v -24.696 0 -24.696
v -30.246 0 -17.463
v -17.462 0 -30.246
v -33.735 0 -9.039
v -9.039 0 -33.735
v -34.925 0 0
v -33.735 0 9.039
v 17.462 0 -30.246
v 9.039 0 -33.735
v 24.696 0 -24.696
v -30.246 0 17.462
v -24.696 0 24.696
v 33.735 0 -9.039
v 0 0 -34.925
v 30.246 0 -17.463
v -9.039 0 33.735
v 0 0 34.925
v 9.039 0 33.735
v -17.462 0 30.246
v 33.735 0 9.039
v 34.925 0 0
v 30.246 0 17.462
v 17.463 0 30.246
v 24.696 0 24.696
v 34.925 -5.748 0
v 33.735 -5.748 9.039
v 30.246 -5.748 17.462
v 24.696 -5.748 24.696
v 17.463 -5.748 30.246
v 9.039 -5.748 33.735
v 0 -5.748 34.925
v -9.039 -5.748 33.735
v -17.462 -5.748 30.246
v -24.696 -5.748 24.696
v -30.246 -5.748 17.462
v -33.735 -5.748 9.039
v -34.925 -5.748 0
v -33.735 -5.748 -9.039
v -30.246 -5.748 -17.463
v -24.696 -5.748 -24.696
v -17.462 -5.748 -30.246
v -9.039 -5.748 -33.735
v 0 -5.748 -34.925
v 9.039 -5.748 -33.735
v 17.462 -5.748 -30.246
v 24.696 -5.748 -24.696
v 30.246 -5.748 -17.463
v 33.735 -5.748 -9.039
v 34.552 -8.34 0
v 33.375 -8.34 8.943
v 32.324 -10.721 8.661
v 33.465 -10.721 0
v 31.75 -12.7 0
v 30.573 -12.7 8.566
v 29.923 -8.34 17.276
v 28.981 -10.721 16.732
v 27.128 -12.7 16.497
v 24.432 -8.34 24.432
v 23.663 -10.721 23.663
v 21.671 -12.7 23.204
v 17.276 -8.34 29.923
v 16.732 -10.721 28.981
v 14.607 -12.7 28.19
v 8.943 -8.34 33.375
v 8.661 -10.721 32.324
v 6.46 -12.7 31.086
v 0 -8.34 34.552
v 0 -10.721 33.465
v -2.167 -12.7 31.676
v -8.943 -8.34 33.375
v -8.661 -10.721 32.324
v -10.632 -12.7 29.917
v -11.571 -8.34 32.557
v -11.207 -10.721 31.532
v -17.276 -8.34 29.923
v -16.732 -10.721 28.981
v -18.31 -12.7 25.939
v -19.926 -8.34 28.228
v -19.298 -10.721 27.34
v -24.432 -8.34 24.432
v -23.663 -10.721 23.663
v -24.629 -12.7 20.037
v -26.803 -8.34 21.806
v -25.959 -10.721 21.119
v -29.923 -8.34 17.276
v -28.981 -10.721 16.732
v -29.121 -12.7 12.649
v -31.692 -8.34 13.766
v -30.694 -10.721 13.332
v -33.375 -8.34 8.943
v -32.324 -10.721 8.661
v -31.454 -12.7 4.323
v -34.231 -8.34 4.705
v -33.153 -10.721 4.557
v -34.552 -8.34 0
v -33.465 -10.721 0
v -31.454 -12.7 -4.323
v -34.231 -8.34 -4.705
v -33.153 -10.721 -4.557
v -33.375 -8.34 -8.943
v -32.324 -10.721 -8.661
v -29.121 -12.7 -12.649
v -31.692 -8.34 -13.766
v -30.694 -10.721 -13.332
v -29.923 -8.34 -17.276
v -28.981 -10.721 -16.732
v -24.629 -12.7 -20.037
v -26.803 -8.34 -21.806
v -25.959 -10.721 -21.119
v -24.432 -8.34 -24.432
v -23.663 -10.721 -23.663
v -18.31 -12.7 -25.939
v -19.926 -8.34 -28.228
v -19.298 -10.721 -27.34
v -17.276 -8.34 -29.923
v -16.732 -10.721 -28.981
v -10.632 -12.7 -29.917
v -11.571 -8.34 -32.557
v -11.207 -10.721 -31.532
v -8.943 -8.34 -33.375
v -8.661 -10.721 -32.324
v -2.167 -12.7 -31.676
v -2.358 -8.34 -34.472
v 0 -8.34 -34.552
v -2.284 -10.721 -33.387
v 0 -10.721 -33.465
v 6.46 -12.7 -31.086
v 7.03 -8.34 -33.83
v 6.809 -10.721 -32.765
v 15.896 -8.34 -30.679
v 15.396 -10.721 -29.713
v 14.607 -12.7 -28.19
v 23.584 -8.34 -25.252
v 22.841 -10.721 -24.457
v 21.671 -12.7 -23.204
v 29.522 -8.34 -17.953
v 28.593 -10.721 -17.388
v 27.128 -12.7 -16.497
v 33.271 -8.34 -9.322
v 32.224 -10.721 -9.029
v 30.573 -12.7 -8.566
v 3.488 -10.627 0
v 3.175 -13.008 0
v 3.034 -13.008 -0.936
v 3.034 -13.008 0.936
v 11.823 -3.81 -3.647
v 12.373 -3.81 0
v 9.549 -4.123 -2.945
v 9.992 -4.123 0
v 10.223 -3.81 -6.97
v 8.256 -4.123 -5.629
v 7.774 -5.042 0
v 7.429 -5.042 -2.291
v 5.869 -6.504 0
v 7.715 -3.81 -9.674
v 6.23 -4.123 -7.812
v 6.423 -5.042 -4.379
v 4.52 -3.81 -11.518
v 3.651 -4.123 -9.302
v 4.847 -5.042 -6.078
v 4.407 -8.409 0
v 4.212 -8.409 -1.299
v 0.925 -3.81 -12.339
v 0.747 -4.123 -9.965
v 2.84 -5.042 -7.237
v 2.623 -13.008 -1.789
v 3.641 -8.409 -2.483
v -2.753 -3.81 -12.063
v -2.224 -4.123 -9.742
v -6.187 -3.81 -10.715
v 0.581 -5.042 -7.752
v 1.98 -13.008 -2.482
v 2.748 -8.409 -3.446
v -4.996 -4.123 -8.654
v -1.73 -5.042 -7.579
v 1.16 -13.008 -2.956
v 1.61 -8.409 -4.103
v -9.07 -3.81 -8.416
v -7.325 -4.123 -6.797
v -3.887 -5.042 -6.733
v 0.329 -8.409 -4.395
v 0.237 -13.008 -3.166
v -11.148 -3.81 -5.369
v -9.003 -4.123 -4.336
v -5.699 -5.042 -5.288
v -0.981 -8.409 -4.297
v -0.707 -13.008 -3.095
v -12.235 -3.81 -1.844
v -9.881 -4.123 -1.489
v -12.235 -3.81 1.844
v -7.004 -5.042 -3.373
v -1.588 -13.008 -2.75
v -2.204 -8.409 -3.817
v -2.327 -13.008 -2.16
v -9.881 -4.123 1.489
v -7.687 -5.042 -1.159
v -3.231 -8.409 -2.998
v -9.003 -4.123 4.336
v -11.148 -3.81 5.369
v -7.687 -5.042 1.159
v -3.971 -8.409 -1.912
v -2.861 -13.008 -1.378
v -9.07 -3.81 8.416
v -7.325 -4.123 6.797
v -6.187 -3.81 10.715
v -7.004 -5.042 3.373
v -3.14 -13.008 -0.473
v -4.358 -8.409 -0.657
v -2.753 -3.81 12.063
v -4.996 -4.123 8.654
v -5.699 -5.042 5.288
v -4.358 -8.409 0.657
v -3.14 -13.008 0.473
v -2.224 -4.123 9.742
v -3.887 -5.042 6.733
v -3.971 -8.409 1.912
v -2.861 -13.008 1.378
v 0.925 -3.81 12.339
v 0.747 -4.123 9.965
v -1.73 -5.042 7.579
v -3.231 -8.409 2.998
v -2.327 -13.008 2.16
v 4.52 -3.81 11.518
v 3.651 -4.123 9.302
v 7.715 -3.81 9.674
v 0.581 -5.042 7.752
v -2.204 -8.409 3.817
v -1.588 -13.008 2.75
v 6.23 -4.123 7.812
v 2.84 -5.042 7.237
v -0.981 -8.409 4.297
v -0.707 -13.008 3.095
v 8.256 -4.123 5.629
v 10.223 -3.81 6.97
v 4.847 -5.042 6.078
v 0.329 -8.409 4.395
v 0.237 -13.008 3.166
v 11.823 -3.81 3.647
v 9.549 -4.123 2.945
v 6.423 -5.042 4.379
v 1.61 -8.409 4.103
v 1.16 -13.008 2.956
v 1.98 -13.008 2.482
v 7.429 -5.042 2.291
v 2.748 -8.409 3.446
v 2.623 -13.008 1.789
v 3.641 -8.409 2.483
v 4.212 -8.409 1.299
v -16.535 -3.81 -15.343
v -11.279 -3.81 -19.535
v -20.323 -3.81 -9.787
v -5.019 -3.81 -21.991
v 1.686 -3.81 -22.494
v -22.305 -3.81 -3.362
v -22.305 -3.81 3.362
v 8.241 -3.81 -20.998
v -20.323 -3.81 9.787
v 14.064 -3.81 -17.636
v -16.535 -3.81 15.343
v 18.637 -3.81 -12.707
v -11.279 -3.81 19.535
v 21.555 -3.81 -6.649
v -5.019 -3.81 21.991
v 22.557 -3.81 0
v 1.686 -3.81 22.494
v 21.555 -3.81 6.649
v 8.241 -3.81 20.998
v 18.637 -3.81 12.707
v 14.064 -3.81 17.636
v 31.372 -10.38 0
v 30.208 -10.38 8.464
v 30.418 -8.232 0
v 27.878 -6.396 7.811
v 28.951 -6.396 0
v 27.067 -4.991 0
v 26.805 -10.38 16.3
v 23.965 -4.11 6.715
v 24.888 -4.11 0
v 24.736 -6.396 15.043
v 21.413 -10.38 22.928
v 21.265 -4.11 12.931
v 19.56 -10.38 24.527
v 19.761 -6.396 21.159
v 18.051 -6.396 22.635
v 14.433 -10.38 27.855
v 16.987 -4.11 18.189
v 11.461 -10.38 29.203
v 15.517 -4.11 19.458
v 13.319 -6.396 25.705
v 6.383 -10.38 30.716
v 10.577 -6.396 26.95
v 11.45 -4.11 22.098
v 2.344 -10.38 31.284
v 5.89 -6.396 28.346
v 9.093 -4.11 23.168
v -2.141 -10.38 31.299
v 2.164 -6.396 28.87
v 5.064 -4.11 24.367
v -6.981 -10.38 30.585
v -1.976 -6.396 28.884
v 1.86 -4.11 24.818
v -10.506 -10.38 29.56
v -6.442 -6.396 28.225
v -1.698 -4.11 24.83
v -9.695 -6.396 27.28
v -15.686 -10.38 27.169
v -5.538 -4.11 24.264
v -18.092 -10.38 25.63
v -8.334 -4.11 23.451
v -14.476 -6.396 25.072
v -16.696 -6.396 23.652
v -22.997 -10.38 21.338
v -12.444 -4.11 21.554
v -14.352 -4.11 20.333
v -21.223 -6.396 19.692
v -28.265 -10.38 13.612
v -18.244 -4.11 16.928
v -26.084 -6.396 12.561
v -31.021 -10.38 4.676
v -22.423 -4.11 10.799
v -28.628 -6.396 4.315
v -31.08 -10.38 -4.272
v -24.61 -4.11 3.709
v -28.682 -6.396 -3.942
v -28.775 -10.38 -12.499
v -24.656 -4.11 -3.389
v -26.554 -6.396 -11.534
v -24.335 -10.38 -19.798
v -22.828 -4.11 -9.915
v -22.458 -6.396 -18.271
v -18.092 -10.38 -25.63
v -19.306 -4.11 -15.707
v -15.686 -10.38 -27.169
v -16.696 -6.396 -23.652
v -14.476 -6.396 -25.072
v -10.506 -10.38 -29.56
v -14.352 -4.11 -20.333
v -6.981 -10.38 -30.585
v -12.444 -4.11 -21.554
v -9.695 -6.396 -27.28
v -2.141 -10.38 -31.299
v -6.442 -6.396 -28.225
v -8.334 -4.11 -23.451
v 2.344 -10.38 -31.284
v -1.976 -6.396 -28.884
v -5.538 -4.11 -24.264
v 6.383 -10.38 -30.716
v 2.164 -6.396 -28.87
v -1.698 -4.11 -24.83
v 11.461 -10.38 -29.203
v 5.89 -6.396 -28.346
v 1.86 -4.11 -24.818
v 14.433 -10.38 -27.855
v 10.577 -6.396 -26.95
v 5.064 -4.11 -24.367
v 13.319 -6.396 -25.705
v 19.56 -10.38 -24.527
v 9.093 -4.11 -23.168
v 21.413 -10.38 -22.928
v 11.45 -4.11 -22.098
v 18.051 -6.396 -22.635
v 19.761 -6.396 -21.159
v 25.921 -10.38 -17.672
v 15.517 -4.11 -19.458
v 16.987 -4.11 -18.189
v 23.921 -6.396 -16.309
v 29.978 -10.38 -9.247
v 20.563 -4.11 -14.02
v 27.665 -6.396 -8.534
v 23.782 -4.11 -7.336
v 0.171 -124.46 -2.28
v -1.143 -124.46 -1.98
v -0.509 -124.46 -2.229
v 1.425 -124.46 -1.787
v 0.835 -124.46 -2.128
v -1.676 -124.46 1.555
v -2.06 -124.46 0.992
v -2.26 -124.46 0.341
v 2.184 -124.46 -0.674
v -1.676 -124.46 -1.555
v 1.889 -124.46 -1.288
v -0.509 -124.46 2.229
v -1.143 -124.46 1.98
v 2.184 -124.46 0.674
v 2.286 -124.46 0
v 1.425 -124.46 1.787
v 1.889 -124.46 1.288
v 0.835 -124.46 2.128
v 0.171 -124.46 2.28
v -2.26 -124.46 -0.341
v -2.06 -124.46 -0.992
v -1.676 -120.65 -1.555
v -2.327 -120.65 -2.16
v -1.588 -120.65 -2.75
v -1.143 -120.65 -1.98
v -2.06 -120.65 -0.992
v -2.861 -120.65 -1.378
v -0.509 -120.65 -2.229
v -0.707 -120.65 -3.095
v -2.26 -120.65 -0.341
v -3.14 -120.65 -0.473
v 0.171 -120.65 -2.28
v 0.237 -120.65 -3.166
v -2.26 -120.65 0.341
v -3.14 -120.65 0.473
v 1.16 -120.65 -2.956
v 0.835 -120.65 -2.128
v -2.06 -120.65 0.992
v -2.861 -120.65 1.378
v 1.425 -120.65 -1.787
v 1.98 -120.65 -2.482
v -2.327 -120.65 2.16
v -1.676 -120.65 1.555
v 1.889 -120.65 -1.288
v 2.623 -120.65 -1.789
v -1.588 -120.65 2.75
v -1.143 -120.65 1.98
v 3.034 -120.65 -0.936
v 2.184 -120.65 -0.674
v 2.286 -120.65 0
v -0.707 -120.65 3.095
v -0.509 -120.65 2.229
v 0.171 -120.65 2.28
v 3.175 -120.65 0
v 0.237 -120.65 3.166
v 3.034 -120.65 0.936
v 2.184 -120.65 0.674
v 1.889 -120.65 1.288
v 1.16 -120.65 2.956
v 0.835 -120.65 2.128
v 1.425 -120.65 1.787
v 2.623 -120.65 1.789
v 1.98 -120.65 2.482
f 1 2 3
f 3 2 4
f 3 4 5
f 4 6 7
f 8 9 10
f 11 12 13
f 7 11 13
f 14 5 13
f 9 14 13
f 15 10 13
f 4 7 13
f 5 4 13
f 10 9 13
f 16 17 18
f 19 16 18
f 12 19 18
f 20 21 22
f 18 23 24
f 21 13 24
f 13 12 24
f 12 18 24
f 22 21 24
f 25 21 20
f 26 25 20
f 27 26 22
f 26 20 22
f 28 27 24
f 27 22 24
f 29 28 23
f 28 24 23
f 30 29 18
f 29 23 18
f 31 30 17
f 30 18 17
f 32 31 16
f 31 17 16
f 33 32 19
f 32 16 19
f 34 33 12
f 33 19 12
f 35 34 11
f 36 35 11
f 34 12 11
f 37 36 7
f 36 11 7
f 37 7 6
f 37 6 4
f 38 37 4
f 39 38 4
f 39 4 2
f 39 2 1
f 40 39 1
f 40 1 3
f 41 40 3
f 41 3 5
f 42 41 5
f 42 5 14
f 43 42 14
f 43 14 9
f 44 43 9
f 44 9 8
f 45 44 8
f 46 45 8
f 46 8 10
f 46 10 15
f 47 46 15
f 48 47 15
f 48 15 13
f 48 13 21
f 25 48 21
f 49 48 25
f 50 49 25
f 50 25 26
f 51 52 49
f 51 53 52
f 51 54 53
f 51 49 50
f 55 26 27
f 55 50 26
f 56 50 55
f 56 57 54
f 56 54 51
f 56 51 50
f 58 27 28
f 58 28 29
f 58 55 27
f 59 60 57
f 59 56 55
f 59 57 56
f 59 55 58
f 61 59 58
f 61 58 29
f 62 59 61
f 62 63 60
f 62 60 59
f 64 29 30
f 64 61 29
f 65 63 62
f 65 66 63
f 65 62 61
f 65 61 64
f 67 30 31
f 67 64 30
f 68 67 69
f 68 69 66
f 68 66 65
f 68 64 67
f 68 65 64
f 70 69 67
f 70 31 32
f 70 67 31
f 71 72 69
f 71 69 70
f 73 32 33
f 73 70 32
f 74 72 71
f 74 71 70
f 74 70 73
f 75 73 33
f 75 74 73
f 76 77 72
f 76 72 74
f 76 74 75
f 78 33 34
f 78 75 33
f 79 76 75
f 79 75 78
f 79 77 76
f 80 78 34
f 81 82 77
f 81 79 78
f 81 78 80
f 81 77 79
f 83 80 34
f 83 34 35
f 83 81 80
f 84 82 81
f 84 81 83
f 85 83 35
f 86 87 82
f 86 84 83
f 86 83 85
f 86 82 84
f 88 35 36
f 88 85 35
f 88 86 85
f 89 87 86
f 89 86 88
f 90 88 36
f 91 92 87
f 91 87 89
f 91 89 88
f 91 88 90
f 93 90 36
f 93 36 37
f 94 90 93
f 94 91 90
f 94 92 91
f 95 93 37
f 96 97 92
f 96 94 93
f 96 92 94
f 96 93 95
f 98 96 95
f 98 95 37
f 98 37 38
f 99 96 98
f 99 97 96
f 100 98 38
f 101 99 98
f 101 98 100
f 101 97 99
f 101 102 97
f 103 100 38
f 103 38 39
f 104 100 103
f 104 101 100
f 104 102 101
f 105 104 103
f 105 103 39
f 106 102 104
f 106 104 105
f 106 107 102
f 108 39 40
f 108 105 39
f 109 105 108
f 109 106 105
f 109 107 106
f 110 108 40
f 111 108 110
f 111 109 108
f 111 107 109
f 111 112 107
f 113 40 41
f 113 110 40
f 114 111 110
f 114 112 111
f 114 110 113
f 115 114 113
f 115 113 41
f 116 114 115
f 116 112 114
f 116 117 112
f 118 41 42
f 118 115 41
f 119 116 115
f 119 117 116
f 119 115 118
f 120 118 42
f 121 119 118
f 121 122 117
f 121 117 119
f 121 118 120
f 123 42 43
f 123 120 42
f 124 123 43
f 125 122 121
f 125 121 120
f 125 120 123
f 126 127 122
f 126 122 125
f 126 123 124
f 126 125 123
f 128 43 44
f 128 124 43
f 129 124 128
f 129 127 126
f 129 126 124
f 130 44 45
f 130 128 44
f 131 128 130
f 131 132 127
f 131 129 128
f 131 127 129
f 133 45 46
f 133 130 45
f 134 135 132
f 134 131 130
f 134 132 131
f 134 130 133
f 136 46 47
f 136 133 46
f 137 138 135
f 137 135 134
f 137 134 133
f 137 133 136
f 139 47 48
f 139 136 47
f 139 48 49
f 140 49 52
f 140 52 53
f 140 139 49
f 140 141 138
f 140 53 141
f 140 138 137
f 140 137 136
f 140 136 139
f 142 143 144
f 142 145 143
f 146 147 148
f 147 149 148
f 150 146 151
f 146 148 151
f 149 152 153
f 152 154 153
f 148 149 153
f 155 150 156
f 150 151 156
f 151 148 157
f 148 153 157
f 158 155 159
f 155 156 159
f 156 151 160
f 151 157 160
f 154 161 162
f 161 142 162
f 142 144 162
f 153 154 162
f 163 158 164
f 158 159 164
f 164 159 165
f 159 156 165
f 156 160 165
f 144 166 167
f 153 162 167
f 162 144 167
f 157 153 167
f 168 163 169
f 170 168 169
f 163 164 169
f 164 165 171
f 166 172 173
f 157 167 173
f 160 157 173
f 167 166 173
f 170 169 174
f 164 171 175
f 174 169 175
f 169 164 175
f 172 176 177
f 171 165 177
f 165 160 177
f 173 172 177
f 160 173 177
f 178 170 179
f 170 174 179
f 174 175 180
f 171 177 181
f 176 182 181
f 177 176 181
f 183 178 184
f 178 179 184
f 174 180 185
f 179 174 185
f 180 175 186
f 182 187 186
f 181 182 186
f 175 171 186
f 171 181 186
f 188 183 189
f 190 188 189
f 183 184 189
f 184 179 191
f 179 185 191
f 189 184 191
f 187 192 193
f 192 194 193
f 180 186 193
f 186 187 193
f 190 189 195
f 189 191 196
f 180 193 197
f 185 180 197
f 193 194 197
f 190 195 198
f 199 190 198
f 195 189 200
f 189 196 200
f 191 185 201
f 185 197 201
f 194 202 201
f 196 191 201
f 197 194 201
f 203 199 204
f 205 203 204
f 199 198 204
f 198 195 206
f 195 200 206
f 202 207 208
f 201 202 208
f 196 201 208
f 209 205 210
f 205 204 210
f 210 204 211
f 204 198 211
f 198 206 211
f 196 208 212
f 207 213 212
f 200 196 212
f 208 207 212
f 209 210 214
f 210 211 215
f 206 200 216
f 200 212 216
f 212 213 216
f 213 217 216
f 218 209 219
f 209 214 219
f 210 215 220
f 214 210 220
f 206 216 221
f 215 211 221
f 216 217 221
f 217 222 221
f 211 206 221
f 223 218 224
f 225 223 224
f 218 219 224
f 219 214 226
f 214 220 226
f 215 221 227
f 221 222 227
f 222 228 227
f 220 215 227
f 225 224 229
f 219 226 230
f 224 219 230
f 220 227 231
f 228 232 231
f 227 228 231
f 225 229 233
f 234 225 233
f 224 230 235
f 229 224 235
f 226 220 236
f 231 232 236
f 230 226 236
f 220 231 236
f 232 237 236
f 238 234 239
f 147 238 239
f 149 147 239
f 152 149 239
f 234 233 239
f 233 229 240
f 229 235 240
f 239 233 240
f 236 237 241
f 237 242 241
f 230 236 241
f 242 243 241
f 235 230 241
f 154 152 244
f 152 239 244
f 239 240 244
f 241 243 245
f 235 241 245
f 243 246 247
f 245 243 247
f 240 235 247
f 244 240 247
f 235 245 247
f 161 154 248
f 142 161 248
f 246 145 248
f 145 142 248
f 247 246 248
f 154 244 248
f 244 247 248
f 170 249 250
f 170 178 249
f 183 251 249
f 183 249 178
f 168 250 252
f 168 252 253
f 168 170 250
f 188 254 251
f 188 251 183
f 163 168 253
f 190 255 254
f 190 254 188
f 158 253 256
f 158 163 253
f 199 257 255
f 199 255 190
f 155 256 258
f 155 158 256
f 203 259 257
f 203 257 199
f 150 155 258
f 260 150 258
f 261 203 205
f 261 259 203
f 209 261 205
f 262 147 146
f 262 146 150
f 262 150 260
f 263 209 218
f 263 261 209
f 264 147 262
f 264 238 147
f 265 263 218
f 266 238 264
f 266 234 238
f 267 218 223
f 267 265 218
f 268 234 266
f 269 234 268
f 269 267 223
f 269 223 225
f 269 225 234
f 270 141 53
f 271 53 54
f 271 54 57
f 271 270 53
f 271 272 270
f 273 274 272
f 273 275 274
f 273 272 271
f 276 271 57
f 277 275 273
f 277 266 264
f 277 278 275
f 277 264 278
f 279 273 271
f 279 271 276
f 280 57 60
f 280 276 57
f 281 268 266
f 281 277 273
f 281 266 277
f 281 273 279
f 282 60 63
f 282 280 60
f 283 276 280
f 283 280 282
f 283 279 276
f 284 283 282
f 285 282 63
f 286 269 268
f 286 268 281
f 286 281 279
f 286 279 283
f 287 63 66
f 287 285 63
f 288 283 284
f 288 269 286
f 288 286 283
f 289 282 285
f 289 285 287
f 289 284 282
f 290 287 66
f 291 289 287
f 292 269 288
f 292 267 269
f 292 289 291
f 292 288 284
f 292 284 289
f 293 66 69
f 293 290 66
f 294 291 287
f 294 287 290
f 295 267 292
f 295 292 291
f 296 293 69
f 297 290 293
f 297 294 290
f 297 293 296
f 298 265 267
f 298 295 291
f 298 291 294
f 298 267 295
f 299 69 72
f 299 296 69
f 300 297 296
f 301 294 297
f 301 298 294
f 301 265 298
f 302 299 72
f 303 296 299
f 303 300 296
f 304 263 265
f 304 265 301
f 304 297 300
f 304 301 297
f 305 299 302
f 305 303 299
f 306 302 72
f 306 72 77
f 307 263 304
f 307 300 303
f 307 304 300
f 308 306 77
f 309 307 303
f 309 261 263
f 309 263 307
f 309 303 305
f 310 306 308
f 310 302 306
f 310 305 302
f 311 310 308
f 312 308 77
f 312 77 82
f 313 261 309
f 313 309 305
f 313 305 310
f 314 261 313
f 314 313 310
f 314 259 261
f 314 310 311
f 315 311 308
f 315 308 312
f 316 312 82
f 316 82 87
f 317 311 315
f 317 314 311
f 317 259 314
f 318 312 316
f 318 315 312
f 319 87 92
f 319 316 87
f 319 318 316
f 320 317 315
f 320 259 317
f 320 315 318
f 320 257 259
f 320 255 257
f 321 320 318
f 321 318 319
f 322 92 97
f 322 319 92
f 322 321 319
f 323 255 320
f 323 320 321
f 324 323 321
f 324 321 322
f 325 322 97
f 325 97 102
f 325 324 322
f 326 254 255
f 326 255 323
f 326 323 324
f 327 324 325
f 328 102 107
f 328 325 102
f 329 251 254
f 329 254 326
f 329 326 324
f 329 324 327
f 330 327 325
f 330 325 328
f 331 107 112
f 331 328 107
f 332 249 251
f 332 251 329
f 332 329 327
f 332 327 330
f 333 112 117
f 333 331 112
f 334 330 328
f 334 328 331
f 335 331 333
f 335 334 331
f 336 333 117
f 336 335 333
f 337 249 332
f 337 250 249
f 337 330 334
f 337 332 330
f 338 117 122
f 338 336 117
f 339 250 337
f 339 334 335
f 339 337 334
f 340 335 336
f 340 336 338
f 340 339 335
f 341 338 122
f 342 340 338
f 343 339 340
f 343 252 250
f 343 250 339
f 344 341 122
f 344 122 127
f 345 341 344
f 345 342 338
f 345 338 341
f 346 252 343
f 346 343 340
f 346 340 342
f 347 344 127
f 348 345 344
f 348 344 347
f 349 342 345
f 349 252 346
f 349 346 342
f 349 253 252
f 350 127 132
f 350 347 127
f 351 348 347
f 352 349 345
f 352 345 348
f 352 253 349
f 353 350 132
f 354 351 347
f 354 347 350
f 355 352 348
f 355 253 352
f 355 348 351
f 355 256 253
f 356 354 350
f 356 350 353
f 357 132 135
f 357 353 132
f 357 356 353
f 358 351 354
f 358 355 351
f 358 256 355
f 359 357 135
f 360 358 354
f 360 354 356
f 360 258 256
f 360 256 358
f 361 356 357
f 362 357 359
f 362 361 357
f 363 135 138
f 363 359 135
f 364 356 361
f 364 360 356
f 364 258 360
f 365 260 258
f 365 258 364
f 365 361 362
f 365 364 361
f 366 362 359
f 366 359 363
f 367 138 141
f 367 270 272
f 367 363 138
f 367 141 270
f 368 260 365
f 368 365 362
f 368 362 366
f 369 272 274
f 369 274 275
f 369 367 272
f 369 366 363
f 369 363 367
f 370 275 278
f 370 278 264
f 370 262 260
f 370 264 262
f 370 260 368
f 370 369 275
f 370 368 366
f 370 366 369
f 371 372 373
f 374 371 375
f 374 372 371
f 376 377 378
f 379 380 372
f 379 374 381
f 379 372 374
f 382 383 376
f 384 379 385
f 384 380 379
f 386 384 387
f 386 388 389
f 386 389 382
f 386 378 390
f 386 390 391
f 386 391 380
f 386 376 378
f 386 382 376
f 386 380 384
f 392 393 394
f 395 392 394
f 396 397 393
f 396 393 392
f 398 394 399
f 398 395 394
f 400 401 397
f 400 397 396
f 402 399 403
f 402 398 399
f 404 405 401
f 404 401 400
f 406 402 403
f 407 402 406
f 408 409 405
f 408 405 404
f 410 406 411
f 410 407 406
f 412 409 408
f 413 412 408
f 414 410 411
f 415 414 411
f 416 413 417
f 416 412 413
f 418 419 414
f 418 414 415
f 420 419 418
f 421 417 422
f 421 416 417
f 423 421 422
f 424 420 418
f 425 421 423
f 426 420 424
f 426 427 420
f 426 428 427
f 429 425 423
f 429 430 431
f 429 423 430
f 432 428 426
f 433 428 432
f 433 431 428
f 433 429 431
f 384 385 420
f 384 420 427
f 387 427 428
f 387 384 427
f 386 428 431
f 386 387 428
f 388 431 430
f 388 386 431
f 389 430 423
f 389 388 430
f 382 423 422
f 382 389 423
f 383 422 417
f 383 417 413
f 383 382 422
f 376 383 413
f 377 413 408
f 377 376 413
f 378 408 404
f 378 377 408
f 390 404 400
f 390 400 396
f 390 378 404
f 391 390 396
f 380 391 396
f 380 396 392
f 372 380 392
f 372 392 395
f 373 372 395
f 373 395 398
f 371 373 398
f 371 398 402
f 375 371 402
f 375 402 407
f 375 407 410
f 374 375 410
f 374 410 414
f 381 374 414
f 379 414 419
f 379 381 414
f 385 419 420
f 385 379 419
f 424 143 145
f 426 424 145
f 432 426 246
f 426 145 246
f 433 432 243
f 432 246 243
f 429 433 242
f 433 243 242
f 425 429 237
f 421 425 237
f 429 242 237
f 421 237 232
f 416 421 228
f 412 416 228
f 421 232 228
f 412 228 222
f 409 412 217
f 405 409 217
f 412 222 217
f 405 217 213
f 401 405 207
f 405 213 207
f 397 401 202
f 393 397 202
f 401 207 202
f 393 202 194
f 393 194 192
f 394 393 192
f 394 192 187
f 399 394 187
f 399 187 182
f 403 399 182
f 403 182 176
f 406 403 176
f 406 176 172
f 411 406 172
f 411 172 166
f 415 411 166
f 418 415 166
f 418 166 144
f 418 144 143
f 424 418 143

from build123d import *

# Parameters (mm, degrees)
F0_R     = 31.75
F0_R_2   = 3.175
F1_DEPTH = 3.81
F2_DEPTH = 124.46
F0_R_3   = 34.925
F3_DEPTH = 12.7
F5_R     = 3.175
F5_R_2   = 2.286
F6_DEPTH = 3.81


# Not quite as in the source:
# - a fillet or chamfer that OpenCascade refuses, or shapes differently, is made with other operations: its cross-section is extruded or revolved along the edge and cut away or added


with BuildPart() as f1:
    # F0 (on Front) → F1 (new body)
    with BuildSketch(Plane.XZ):
        Circle(F0_R)
        Circle(F0_R_2, mode=Mode.SUBTRACT)
        Circle(F0_R_2)
    extrude(amount=F1_DEPTH)

    # F0 (on Front) → F2 (join)
    with BuildSketch(Plane.XZ):
        Circle(F0_R_2)
    extrude(amount=F2_DEPTH)

    # F0 (on Front) → F3 (join)
    with BuildSketch(Plane.XZ):
        Circle(F0_R_3)
        Circle(F0_R, mode=Mode.SUBTRACT)
    extrude(amount=F3_DEPTH)

    # F4: fillet of radius 9.1981536726 on 3 edges, made by hand

    # F4_s1 → F4_t2 (revolve)
    with BuildSketch(Plane.XY):
        with BuildLine():
            ThreePointArc((31.75, -12.7), (28.9512095664, -6.3960255802), (22.5570096106, -3.81))
            Line((22.5570096106, -3.81), (31.75, -3.81))
            Line((31.75, -3.81), (31.75, -12.7))
        make_face()
    revolve(axis=Axis((0, -3.81, 0), (0, -1, 0)))

    # F4_s3 → F4_t4 (revolve)
    with BuildSketch(Plane.XY):
        with BuildLine():
            ThreePointArc((12.3731536726, -3.81), (5.8690768363, -6.5040768363), (3.175, -13.0081536726))
            Line((3.175, -13.0081536726), (3.175, -3.81))
            Line((3.175, -3.81), (12.3731536726, -3.81))
        make_face()
    revolve(axis=Axis((0, -3.81, 0), (0, 1, 0)))

    # F4_s5 → F4_t6 (revolve, cut)
    with BuildSketch(Plane.XY):
        with BuildLine():
            ThreePointArc((34.925, -5.7481908239), (34.0936833659, -9.5694561844), (31.75, -12.7))
            Line((31.75, -12.7), (34.925, -12.7))
            Line((34.925, -12.7), (34.925, -5.7481908239))
        make_face()
    revolve(axis=Axis((0, -12.7, 0), (0, -1, 0)), mode=Mode.SUBTRACT)

    # F5 (on face) → F6 (cut)
    with BuildSketch(Plane.XZ.offset(124.46)):
        Circle(F5_R)
        Circle(F5_R_2, mode=Mode.SUBTRACT)
    extrude(amount=-F6_DEPTH, mode=Mode.SUBTRACT)


solid = f1.part
